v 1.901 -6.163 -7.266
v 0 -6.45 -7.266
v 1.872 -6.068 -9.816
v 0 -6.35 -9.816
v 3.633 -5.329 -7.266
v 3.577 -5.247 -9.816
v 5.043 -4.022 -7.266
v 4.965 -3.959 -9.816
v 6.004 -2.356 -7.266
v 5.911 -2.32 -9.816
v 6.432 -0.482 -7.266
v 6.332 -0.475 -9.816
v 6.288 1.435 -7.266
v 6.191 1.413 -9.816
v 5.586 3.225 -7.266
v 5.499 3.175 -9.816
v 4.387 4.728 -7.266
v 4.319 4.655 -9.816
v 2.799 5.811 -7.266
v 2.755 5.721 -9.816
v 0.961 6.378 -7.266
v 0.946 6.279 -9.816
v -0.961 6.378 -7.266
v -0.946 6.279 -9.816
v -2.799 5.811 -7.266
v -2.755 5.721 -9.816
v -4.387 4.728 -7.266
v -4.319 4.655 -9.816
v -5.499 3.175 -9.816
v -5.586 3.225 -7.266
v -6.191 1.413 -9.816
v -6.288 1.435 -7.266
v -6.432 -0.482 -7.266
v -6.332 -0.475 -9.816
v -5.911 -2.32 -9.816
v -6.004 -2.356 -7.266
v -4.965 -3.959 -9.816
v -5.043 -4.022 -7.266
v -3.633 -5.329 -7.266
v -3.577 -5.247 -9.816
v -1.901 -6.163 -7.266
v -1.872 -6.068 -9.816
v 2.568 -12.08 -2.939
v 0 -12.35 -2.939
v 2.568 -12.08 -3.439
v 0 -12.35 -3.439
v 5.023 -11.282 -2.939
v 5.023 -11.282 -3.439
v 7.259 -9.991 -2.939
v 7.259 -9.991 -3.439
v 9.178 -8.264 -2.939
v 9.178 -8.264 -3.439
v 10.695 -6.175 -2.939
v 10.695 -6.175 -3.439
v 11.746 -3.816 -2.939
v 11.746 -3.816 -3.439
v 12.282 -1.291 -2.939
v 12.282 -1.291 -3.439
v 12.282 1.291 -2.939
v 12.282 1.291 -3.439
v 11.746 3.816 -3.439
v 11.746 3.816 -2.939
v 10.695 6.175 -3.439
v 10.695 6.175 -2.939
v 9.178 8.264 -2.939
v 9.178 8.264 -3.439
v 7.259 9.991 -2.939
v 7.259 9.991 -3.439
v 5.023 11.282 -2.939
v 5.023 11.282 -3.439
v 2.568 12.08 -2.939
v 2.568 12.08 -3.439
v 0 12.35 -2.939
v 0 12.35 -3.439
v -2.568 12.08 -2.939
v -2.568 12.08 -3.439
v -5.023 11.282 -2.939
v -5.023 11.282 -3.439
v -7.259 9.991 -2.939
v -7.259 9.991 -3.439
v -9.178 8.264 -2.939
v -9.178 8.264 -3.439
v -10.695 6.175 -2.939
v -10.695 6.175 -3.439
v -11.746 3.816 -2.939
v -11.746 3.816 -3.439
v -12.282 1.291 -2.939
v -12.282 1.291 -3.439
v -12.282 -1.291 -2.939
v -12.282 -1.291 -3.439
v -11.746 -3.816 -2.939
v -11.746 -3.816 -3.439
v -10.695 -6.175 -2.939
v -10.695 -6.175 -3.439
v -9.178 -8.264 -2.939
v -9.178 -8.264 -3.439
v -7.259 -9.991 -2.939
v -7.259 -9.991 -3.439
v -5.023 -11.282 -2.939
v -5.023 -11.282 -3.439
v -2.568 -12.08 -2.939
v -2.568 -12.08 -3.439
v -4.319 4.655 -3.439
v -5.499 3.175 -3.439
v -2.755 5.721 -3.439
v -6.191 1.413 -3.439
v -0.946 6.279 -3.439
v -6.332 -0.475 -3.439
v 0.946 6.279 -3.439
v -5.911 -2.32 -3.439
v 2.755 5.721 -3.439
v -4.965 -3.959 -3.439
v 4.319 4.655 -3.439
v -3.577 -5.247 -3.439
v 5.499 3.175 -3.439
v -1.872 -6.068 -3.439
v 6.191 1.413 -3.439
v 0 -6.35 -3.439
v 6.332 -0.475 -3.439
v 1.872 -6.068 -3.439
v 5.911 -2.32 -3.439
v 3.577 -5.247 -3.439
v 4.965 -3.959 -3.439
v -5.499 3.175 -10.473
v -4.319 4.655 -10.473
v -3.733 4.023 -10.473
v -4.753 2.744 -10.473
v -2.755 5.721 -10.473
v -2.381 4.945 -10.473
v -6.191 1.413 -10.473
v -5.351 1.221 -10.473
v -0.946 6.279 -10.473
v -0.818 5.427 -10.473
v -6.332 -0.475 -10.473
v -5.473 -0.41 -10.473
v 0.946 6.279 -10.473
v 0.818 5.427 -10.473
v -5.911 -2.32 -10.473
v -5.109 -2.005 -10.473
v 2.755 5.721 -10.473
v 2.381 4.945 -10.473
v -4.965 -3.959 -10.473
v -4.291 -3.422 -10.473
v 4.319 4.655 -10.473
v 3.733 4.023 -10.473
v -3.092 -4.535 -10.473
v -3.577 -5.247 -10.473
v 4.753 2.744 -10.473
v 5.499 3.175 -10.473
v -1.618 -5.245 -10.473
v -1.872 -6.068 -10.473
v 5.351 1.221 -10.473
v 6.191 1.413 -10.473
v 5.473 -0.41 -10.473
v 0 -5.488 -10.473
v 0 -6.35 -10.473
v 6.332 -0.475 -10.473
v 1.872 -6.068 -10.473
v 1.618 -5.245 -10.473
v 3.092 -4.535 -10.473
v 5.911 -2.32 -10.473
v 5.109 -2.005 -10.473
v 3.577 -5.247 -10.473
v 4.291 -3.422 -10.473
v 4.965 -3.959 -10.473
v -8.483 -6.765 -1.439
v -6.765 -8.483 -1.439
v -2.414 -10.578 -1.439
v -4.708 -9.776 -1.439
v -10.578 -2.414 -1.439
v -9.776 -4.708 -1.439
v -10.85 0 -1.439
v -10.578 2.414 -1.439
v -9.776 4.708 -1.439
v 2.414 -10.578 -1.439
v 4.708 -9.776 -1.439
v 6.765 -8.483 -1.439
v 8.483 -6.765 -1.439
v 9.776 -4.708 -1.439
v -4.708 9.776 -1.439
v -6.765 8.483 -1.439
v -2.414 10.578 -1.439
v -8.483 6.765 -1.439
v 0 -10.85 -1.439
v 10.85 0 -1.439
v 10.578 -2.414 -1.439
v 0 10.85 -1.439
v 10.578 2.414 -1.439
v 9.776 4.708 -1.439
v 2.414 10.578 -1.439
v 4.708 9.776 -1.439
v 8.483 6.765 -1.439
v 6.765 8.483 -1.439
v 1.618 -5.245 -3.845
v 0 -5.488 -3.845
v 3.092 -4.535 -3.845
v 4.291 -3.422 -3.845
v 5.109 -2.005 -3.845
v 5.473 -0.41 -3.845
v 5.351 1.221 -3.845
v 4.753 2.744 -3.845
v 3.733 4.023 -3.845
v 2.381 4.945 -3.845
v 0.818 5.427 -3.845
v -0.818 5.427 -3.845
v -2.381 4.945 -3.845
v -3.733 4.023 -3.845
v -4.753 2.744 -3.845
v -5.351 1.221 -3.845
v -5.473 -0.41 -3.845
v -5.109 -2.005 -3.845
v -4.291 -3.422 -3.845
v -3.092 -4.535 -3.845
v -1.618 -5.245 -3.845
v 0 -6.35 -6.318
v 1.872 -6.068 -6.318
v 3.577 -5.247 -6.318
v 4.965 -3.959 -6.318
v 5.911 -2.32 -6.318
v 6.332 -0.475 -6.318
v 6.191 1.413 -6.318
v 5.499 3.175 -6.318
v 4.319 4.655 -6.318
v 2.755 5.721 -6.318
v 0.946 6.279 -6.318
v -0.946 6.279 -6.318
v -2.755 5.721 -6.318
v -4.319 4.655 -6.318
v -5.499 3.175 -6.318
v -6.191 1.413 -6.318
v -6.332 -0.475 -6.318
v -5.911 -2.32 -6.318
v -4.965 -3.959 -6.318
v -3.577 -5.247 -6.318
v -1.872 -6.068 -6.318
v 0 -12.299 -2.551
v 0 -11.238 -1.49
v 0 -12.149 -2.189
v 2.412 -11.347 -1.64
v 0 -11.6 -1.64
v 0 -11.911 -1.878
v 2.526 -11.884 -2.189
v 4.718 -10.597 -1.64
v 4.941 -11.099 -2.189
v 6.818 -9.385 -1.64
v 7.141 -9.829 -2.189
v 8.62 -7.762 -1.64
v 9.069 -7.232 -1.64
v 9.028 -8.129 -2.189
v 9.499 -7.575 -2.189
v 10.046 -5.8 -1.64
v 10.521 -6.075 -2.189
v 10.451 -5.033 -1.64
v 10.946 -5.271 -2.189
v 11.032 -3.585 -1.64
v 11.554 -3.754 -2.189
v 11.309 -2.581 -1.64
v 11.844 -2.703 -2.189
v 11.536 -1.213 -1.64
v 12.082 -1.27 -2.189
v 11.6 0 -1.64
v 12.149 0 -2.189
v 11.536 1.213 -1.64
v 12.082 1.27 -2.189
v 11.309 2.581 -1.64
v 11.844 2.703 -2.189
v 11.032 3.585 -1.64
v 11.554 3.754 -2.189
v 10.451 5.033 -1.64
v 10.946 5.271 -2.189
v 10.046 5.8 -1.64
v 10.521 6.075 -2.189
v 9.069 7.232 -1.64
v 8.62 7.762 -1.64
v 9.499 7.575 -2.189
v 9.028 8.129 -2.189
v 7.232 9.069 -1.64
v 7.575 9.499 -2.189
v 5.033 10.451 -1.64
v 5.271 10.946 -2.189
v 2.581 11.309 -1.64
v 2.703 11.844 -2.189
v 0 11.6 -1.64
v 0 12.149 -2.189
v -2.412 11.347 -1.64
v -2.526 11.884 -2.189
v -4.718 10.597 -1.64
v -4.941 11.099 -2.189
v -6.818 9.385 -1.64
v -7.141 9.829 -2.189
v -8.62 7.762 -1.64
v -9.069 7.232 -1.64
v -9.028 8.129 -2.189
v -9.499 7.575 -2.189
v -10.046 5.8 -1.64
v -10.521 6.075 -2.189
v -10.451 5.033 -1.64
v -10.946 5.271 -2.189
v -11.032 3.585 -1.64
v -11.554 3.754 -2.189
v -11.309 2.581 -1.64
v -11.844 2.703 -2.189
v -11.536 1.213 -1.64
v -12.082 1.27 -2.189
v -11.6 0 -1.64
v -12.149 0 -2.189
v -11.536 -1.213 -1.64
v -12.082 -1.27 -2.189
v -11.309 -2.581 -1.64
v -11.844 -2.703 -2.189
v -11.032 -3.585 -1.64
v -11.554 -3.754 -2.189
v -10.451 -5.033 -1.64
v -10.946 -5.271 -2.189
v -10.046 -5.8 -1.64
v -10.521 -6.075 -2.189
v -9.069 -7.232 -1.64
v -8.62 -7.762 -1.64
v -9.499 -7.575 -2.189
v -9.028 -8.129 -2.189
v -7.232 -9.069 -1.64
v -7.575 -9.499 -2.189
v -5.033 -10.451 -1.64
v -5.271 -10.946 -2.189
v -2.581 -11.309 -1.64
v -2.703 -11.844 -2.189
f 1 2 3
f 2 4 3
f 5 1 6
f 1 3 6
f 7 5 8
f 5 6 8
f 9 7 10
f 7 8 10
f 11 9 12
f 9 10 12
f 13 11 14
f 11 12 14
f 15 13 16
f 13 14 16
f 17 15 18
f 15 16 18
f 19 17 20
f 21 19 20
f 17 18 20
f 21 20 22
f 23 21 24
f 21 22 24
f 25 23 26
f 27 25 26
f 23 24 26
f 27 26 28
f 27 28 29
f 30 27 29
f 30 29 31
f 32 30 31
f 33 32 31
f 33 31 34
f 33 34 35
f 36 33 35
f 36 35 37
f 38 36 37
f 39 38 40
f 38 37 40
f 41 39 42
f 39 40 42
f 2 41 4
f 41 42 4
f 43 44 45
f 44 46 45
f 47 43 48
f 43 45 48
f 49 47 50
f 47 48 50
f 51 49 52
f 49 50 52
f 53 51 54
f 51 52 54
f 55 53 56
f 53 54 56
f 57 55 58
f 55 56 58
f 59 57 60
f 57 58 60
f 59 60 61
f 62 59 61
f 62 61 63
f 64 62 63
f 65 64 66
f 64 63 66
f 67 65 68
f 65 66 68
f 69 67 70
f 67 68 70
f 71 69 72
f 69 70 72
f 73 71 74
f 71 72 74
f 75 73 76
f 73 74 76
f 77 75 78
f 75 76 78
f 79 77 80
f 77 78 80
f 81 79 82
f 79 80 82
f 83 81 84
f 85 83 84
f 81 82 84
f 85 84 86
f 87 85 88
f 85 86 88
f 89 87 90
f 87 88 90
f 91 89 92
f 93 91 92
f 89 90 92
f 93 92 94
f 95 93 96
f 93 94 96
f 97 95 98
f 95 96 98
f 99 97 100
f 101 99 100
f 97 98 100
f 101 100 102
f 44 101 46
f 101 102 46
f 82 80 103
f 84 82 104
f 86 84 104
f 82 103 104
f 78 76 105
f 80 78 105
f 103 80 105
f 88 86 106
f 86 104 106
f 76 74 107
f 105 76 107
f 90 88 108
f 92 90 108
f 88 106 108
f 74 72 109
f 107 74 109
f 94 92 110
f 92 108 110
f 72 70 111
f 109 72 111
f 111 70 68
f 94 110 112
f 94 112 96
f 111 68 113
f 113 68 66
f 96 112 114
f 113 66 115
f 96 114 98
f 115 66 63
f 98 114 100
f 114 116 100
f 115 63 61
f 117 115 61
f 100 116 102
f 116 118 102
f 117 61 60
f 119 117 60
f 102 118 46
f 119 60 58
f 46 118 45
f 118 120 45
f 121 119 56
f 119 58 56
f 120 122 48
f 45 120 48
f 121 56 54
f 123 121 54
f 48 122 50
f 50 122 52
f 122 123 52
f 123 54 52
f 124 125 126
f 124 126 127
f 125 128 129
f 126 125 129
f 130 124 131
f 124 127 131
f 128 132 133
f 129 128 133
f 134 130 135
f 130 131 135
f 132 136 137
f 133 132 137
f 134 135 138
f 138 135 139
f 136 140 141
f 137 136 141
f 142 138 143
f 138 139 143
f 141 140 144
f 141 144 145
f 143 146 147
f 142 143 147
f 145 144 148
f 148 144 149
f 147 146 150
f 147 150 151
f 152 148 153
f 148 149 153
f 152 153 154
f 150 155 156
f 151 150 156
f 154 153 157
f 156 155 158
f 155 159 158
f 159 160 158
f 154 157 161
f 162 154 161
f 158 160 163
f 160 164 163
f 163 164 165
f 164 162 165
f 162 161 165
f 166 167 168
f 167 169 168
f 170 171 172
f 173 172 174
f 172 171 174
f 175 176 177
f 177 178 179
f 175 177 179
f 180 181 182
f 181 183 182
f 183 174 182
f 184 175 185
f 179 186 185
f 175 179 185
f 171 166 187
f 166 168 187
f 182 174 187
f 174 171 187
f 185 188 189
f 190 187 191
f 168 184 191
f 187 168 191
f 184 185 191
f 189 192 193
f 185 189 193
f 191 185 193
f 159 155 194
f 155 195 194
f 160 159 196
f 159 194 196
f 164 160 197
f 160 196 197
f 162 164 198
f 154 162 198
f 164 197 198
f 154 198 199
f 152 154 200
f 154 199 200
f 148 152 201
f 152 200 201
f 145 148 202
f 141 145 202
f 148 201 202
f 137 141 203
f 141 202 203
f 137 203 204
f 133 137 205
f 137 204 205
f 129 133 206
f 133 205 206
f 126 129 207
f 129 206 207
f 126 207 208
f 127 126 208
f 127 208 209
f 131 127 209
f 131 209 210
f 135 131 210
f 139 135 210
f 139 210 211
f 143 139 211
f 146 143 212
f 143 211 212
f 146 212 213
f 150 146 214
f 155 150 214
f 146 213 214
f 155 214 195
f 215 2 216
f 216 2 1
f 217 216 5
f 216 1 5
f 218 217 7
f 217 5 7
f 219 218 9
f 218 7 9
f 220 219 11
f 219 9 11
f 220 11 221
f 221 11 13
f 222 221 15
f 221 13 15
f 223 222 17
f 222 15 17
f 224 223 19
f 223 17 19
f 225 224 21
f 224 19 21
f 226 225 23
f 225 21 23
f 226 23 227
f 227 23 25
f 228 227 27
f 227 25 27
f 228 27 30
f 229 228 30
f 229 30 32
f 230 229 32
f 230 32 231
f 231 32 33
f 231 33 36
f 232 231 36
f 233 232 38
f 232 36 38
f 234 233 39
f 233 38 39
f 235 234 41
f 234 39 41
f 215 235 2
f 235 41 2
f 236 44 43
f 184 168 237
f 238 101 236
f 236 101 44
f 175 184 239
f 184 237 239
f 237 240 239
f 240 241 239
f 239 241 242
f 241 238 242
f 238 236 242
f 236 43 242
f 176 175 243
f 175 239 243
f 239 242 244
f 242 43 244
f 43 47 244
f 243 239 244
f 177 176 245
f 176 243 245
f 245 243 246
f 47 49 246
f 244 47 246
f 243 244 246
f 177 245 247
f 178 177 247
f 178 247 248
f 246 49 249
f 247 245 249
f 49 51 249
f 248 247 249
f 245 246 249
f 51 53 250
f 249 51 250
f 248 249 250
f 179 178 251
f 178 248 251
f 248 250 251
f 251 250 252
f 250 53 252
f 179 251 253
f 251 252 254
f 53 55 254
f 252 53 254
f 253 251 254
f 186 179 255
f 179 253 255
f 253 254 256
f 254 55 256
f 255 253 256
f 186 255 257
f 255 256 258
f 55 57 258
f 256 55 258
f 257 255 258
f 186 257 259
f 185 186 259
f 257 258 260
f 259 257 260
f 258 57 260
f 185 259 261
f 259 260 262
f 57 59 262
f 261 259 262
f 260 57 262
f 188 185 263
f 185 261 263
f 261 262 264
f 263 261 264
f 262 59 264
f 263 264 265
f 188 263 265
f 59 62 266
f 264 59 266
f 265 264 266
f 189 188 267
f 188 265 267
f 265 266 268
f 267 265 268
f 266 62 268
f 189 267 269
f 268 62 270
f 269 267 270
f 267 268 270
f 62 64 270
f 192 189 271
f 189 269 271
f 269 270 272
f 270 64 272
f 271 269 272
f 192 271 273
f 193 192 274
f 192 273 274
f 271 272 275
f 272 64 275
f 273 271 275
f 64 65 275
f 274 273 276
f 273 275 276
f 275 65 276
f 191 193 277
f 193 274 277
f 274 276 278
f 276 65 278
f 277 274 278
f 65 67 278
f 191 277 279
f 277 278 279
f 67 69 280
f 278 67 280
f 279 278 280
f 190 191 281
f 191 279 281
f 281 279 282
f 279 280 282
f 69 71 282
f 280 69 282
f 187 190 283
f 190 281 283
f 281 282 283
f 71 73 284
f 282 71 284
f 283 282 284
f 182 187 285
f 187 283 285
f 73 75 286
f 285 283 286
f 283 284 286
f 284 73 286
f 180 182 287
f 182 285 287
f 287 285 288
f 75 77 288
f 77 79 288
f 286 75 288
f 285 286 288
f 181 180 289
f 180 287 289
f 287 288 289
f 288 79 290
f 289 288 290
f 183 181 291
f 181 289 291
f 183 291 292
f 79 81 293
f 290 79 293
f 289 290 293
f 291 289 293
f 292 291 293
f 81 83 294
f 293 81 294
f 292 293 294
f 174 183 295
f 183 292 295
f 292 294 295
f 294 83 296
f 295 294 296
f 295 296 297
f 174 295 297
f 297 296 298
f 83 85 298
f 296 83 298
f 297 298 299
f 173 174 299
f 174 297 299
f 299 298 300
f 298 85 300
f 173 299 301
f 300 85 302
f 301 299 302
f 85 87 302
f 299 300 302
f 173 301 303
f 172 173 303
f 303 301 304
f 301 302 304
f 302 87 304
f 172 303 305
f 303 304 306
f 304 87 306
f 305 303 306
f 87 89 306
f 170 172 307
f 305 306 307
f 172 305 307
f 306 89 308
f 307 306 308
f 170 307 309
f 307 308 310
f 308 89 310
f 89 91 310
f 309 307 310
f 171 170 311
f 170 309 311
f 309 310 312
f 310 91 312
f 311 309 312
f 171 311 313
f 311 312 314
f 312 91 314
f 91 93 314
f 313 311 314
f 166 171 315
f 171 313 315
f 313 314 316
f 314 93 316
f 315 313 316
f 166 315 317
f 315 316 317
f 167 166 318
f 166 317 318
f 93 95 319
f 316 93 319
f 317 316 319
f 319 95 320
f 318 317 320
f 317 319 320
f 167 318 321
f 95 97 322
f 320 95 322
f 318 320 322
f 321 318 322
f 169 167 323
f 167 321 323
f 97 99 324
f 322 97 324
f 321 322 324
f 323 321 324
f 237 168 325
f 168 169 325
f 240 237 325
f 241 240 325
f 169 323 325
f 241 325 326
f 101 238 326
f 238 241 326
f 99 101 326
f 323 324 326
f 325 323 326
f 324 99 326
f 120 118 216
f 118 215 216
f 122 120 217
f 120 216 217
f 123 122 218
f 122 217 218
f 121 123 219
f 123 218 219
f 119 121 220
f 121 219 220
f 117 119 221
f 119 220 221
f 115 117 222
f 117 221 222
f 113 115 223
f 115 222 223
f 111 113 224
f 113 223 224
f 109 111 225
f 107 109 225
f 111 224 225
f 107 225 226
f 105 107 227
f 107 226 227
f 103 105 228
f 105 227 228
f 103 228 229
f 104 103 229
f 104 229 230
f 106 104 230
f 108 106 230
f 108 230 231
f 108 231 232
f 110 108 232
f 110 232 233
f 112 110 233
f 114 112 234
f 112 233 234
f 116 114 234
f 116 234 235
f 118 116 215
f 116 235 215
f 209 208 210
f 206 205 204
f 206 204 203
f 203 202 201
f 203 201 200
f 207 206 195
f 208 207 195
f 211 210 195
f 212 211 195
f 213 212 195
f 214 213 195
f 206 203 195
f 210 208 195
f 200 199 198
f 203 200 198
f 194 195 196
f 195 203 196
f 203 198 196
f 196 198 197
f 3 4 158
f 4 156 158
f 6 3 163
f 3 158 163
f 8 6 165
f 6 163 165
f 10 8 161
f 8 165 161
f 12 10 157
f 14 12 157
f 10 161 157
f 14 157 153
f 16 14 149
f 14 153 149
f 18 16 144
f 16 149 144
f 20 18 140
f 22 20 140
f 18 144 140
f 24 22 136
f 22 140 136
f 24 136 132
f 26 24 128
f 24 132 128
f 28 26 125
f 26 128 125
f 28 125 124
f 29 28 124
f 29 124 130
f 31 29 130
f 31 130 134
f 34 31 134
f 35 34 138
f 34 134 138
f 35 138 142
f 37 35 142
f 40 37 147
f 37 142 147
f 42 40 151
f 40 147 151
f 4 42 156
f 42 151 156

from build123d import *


with BuildPart() as f1:
    # F0 (on Right) → F1 (revolve)
    with BuildSketch(Plane.YZ):
        with BuildLine():
            Line((-6.35, -10.473485), (-5.488451, -10.473485))
            Line((-5.488451, -10.473485), (-5.488451, -3.844697))
            Line((-5.488451, -3.844697), (0, -3.844697))
            Line((0, -3.844697), (0, -1.438863))
            Line((0, -1.438863), (-10.85, -1.438863))
            ThreePointArc((-10.85, -1.438863), (-11.91066, -1.878203), (-12.35, -2.938863))
            Line((-12.35, -2.938863), (-12.35, -3.438863))
            Line((-12.35, -3.438863), (-6.35, -3.438863))
            Line((-6.35, -3.438863), (-6.35, -6.318287))
            Line((-6.35, -6.318287), (-6.35, -9.81605))
            Line((-6.35, -9.81605), (-6.35, -10.473485))
        make_face()
        Polygon((-6.45, -7.265888), (-6.35, -9.81605), (-6.35, -6.318287), align=None)
    revolve(axis=Axis((0, 0, 16.107956), (0, 0, 1)))


solid = f1.part
